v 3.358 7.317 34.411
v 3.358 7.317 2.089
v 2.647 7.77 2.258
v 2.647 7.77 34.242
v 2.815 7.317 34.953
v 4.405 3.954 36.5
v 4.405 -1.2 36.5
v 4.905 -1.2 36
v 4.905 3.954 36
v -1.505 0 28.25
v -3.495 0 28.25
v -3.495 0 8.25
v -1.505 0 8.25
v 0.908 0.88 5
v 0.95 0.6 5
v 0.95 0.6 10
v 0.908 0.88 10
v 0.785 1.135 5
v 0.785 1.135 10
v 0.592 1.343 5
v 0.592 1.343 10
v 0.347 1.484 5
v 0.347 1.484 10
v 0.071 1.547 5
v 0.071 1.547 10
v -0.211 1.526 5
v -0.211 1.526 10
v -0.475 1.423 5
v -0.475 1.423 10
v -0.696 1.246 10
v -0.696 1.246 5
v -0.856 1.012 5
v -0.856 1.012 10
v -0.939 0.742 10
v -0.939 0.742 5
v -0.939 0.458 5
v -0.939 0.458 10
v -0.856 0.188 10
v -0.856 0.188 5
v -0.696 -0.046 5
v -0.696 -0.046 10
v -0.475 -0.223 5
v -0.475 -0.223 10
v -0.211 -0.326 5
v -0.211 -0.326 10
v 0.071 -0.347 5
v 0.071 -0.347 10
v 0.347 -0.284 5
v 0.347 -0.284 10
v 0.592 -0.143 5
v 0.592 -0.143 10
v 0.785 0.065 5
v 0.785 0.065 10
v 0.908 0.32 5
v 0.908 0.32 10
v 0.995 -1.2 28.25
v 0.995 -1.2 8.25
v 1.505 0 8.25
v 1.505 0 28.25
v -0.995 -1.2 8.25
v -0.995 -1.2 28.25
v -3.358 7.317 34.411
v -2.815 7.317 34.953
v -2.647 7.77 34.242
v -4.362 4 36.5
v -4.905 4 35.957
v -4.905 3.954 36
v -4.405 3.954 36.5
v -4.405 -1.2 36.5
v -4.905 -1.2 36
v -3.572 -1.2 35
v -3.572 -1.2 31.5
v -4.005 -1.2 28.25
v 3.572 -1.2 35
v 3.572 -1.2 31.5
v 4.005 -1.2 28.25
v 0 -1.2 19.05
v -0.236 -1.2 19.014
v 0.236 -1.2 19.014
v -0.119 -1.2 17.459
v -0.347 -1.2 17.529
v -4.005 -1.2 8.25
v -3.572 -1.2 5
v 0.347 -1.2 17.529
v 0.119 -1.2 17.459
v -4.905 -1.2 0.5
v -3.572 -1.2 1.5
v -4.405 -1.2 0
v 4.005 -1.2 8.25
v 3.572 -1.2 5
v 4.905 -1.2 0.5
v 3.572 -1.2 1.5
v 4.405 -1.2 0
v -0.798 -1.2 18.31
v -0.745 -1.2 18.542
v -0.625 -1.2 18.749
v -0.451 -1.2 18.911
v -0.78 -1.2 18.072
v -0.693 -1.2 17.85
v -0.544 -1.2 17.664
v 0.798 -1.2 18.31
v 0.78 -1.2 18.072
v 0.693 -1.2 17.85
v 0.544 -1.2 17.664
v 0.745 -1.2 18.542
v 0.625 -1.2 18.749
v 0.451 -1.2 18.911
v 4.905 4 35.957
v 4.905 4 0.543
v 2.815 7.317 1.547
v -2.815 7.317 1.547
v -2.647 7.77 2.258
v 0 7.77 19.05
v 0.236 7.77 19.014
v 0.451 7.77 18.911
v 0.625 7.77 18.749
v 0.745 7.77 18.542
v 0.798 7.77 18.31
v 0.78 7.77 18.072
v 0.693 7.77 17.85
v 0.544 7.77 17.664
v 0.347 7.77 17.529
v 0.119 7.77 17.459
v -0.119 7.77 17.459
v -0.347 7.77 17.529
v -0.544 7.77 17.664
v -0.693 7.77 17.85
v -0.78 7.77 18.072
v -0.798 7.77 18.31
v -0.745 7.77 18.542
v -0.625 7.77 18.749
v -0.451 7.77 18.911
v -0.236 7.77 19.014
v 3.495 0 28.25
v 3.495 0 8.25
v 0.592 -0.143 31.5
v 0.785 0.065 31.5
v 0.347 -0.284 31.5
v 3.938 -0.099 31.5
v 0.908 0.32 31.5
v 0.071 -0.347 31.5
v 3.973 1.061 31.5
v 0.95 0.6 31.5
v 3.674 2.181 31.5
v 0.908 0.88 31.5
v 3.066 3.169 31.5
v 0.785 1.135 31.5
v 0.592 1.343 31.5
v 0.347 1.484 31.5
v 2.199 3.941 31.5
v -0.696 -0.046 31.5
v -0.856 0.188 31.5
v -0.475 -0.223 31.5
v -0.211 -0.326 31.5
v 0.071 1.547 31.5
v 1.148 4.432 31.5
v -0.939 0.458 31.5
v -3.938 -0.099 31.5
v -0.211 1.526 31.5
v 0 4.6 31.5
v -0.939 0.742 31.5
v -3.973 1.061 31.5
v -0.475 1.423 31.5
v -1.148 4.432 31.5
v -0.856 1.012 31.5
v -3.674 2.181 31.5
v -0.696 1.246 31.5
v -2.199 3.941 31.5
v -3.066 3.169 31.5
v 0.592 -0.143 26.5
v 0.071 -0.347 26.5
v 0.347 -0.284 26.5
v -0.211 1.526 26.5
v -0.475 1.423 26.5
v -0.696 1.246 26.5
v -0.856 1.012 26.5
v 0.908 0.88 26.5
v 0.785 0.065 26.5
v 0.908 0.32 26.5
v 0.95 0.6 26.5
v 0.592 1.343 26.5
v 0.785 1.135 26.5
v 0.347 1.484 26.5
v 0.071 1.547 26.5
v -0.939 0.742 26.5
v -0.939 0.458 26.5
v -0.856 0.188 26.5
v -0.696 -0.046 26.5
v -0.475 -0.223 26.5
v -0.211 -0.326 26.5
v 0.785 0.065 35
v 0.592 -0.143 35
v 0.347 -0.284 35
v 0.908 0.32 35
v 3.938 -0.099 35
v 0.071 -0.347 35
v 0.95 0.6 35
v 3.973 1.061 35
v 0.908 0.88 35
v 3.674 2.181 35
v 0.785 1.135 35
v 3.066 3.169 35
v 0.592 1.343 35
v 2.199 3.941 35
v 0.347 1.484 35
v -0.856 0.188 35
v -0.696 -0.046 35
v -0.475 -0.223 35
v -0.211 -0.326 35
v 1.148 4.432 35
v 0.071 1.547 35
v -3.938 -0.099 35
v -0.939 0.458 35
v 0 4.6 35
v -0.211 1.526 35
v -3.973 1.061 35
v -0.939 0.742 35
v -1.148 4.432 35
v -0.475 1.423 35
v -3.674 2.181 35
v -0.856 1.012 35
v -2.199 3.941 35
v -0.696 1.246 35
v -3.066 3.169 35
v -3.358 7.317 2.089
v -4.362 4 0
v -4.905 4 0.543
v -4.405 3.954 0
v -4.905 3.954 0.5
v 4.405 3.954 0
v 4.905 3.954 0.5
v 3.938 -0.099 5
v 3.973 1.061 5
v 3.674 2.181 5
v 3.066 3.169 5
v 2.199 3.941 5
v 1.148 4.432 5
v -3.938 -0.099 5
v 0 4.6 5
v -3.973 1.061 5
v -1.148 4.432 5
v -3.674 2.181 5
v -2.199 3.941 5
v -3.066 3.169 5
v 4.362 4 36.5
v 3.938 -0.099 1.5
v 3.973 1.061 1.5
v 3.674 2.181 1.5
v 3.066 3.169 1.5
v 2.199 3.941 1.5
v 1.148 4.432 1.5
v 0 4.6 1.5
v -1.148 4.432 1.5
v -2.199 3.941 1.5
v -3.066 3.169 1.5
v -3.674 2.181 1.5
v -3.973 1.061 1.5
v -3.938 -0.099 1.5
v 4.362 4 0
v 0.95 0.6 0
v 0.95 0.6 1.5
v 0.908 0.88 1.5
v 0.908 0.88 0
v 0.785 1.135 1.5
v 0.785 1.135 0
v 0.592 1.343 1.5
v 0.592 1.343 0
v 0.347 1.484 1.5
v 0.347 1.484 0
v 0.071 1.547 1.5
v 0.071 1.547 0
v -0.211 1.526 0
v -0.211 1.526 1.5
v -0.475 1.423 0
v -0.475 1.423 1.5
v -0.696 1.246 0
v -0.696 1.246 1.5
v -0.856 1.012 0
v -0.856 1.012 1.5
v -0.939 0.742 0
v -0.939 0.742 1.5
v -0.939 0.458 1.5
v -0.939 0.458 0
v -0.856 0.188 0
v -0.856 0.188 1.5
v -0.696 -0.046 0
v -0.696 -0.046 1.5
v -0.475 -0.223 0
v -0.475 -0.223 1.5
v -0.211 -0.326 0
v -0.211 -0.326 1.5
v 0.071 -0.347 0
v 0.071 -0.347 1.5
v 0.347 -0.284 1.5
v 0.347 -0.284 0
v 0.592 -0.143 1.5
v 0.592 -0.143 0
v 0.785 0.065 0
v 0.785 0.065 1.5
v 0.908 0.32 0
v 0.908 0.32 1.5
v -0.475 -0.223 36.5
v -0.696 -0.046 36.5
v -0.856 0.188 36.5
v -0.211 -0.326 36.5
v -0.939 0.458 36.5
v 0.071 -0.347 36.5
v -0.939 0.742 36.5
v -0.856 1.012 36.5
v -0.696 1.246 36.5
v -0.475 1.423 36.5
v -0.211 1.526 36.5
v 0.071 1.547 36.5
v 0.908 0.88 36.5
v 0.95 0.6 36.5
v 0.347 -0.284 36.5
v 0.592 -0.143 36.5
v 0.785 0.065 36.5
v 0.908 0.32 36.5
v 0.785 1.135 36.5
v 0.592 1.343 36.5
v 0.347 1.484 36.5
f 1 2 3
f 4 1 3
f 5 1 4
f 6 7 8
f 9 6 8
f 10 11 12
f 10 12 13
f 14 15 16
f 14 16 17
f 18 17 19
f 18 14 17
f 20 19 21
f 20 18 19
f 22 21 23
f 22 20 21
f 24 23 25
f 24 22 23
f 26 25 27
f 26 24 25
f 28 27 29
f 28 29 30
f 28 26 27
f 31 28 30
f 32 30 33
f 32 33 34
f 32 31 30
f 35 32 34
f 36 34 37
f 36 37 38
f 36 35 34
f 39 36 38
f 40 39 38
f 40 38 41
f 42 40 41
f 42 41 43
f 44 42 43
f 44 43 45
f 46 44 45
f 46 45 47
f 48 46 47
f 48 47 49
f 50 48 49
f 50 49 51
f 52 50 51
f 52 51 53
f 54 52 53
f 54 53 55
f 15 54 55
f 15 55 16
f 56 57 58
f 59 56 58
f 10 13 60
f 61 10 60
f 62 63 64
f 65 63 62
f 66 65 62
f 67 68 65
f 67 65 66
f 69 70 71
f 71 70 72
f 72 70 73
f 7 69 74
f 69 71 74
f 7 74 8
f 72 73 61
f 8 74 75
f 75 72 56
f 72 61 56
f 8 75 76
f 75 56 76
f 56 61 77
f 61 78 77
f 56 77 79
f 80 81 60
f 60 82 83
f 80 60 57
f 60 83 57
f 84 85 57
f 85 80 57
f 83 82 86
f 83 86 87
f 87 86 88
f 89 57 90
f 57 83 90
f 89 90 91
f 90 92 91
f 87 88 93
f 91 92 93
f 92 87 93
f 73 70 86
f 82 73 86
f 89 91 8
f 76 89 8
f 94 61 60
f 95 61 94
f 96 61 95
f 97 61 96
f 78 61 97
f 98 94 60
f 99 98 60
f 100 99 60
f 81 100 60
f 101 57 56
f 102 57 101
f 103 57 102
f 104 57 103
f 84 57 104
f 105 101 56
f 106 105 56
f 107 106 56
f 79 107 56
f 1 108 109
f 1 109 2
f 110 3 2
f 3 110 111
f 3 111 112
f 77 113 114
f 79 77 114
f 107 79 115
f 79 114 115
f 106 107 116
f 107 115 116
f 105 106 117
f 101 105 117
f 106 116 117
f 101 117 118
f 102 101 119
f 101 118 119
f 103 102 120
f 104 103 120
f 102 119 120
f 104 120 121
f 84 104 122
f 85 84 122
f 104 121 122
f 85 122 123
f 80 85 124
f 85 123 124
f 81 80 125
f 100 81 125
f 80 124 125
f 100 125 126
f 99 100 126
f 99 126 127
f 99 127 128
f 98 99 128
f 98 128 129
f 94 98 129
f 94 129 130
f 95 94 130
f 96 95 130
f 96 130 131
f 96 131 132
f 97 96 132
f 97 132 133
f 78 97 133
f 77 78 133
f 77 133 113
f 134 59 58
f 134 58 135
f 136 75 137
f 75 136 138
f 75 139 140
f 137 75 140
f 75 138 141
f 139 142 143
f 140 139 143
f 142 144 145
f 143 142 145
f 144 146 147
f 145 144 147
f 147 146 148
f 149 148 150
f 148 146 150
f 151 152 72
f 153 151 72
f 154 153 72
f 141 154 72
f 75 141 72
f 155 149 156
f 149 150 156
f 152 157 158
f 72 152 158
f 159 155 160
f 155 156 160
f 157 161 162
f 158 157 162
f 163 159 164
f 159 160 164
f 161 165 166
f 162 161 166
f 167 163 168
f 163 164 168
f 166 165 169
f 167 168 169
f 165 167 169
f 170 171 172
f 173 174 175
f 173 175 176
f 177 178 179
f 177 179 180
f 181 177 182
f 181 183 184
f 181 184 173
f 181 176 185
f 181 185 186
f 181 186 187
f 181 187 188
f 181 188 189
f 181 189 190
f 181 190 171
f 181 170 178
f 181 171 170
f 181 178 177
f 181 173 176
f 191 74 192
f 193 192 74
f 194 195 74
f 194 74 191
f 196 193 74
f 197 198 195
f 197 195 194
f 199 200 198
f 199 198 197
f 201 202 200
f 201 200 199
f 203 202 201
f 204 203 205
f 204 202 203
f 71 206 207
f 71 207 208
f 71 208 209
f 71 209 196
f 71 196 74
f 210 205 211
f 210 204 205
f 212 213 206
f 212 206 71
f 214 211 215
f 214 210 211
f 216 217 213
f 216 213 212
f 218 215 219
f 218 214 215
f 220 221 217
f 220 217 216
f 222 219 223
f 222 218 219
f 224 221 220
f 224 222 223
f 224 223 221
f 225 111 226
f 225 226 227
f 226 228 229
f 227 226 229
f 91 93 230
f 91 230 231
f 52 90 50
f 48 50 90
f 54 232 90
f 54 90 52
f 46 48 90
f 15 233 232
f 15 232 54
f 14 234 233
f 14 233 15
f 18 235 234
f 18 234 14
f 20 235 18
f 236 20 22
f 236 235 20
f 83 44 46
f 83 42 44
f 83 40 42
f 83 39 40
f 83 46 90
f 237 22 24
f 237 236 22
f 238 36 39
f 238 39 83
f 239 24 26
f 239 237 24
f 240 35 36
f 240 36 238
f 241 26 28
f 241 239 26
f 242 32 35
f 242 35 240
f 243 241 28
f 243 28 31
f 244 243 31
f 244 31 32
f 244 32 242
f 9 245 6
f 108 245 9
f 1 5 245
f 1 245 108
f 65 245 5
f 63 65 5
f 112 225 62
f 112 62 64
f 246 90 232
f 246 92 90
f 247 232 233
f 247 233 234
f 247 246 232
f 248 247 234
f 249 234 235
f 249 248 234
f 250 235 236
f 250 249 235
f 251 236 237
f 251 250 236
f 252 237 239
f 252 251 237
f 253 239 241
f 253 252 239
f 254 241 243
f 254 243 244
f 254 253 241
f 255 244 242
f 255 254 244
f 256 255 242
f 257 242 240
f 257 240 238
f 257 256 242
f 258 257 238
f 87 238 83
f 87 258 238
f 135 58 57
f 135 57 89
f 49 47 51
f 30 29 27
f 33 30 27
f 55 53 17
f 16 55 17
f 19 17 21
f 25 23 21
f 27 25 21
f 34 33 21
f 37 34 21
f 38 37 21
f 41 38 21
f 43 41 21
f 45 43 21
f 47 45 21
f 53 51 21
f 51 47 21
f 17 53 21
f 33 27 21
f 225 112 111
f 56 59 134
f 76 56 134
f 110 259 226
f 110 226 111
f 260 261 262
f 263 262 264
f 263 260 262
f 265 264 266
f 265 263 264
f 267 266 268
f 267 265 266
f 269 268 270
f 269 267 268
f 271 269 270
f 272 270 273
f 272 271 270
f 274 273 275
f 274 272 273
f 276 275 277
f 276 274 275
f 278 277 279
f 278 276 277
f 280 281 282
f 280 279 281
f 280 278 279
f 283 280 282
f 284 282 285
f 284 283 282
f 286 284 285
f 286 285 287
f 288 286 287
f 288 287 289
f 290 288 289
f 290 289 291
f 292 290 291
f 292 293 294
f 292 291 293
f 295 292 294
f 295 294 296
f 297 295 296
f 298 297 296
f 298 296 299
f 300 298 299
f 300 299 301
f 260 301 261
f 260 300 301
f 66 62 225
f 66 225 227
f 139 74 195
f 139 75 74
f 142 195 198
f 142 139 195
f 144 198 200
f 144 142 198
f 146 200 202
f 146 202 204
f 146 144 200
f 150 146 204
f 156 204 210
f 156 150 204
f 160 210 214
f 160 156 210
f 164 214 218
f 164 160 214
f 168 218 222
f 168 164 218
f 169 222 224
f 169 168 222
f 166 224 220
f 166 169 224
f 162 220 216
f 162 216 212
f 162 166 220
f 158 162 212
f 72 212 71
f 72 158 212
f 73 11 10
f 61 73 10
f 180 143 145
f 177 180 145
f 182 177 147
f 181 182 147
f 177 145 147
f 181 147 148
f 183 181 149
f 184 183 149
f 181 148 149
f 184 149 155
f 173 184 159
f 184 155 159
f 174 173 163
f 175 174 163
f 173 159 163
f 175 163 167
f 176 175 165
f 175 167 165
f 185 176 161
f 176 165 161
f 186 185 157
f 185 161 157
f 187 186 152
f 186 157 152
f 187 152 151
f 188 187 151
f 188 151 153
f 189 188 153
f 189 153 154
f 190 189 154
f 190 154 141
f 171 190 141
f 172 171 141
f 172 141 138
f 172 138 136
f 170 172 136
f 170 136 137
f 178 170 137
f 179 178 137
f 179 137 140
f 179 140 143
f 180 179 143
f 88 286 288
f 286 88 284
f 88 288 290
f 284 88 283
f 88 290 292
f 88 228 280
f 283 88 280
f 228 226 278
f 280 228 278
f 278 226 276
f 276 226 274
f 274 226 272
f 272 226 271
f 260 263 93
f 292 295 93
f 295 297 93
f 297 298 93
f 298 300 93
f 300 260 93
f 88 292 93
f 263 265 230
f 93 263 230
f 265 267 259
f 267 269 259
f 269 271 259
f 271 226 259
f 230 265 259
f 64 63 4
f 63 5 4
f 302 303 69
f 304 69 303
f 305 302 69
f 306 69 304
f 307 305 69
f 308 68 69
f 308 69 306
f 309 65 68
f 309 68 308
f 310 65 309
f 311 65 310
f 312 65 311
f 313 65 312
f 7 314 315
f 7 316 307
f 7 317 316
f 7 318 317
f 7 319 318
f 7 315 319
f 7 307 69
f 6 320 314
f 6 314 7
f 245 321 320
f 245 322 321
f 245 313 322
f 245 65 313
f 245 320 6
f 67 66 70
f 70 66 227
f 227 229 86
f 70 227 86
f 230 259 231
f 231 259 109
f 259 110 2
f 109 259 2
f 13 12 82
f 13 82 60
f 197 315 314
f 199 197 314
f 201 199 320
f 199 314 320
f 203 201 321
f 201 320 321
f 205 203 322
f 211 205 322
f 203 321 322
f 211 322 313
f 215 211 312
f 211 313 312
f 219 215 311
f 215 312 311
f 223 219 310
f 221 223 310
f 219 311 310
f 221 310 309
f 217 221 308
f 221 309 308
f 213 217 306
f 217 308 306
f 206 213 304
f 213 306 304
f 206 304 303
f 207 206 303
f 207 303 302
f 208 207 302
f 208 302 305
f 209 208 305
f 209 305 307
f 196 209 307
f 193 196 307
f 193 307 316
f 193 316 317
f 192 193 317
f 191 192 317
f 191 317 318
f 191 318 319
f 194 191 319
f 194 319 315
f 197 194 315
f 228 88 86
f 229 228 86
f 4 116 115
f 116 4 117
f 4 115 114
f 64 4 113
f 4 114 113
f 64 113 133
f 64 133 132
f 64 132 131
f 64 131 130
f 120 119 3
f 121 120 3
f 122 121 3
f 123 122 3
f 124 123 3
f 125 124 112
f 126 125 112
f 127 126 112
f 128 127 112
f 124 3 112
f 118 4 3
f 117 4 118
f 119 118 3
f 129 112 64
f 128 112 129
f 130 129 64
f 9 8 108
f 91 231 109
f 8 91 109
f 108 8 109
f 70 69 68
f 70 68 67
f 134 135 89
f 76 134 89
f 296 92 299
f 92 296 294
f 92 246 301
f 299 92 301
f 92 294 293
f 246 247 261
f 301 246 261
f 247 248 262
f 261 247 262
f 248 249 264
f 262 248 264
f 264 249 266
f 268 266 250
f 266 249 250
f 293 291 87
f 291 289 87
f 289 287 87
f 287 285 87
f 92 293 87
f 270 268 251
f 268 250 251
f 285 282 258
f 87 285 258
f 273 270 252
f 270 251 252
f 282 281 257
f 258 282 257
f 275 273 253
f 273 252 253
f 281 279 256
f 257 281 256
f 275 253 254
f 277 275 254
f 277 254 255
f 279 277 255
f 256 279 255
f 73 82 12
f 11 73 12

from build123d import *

# Parameters (mm, degrees)
EXTRUDE_1_DEPTH     = 36.5
CUT_EXTRUDE_1_DEPTH = 39.585575484
SKETCH_3_W          = 8.80936978
SKETCH_3_H          = 5.154088086
EXTRUDE_3_DEPTH     = 8.25
SKETCH_4_R          = 0.95
CUT_EXTRUDE_2_DEPTH = 10
SKETCH_5_W          = 4
SKETCH_5_H          = 3.5
SKETCH_6_R          = 0.8
CUT_EXTRUDE_3_DEPTH = 38.904707278


with BuildPart() as part:
    # ｽｹｯﾁ1 → ﾎﾞｽ - 押し出し1 (new body)
    with BuildSketch(Plane.XY):
        Polygon((-3.49531511, 0), (-1.50468489, 0), (-0.99531511, -1.2), (0.99531511, -1.2), (1.50468489, 0), (3.49531511, 0), (4.00468489, -1.2), (4.90468489, -1.2), (4.90468489, 4), (3.146705018, 7.77), (-3.146705018, 7.77), (-4.90468489, 4), (-4.90468489, -1.2), (-4.00468489, -1.2), align=None)
    extrude(amount=EXTRUDE_1_DEPTH)

    # ｽｹｯﾁ2 → ｶｯﾄ - 押し出し1 (cut, through all)
    with BuildSketch(Plane(origin=(4.90468489, 0, 0), x_dir=(0, 0, -1), z_dir=(1, 0, 0))):
        Polygon((-36.5, 4), (-34.742020129, 7.77), (-36.5, 7.77), align=None)
        Polygon((-1.757979871, 7.77), (0, 7.77), (0, 4), align=None)
    extrude(amount=-CUT_EXTRUDE_1_DEPTH, mode=Mode.SUBTRACT)

    # 面取り1
    # the kernel refuses this chamfer: 0.5 mm, written as the material it takes off along each edge
    with BuildSketch(Plane(origin=(-2.939971721, 7.467897404, 1.964713169), x_dir=(0.19590671622030337, 0.5268881046463144, 0.8270486586180961), z_dir=(-0.41632572739388213, 0.8082980746110389, -0.4163257273938791)), Plane(origin=(2.939971721, 7.467897404, 1.964713169), x_dir=(-0.8270486586180947, 0.5268881046463163, 0.1959067162203037), z_dir=(0.4163257273938816, 0.8082980746110384, -0.41632572739388035))) as chamfer_1_piece_1:
        Polygon((-0.400884159, 0.228990916), (0.459173014, 0.228990916), (-0.058288855, -0.457981831), align=None)
    extrude(amount=0.4579583, mode=Mode.SUBTRACT)
    with BuildSketch(Plane(origin=(-2.939971721, 7.467897404, 34.535286831), x_dir=(-0.1959067162203061, -0.5268881046463181, 0.827048658618093), z_dir=(-0.4163257273938827, 0.8082980746110371, 0.4163257273938816))) as chamfer_1_piece_2:
        Polygon((-0.459173014, 0.228990916), (0.400884159, 0.228990916), (0.058288855, -0.457981831), align=None)
    extrude(amount=0.4579583, mode=Mode.SUBTRACT)
    with BuildSketch(Plane(origin=(2.939971721, 7.467897404, 34.535286831), x_dir=(-0.8270486586180942, 0.5268881046463159, -0.19590671622030717), z_dir=(0.41632572739387785, 0.8082980746110375, 0.41632572739388596))) as chamfer_1_piece_3:
        Polygon((-0.400884159, -0.228990916), (0.459173014, -0.228990916), (-0.058288855, 0.457981831), align=None)
    extrude(amount=0.4579583, mode=Mode.SUBTRACT)
    with BuildSketch(Plane(origin=(4.90468489, -2.485841494, 36.5), x_dir=(-0.999621916911297, 0, 0.0274958766105822), z_dir=(0, 1, 0)), Plane(origin=(-4.90468489, 5.285841494, 36.5), x_dir=(0.999621916911297, 0, 0.0274958766105822), z_dir=(0, -1, 0))) as chamfer_1_piece_4:
        with BuildLine():
            Line((0.514336598, 0), (-0.028273577, -0.513558897))
            Line((-0.028273577, -0.513558897), (-0.038269797, -0.513283938))
            ThreePointArc((-0.038269797, -0.513283938), (-0.017064614, -0.256698915), (-0.009996219, 0.000274959))
            Line((-0.009996219, 0.000274959), (0.000274959, 0.009996219))
            ThreePointArc((0.000274959, 0.009996219), (0.257248832, 0.002927825), (0.514611556, 0.009996219))
            Line((0.514611556, 0.009996219), (0.514336598, 0))
        make_face()
    extrude(amount=7.771682988, mode=Mode.SUBTRACT)
    with BuildSketch(Plane(origin=(-4.90468489, 5.285841494, 0), x_dir=(0.9996219169112968, 0, -0.02749587661058639), z_dir=(0, -1, 0)), Plane(origin=(4.90468489, -2.485841494, 0), x_dir=(-0.9996219169112968, 0, -0.02749587661058639), z_dir=(0, 1, 0))) as chamfer_1_piece_5:
        with BuildLine():
            Line((0.514336598, 0), (-0.028273577, 0.513558897))
            Line((-0.028273577, 0.513558897), (-0.038269797, 0.513283938))
            ThreePointArc((-0.038269797, 0.513283938), (-0.017064614, 0.256698915), (-0.009996219, -0.000274959))
            Line((-0.009996219, -0.000274959), (0.000274959, -0.009996219))
            ThreePointArc((0.000274959, -0.009996219), (0.257248832, -0.002927825), (0.514611556, -0.009996219))
            Line((0.514611556, -0.009996219), (0.514336598, 0))
        make_face()
    extrude(amount=7.771682988, mode=Mode.SUBTRACT)
    with BuildSketch(Plane(origin=(-3.146705018, 7.77, 0.46553106), x_dir=(-0.4413655645980938, -0.8973273864019787, 0), z_dir=(0, 0, 1))) as chamfer_1_piece_6:
        with BuildLine():
            Line((0.516979525, 0), (-0.237770334, 0.459056747))
            Line((-0.237770334, 0.459056747), (-0.246743608, 0.454643091))
            ThreePointArc((-0.246743608, 0.454643091), (-0.123037104, 0.227486173), (-0.008973274, -0.004413656))
            Line((-0.008973274, -0.004413656), (0.000207861, -0.009997839))
            ThreePointArc((0.000207861, -0.009997839), (0.25858594, -0.004626004), (0.517187386, -0.009997839))
            Line((0.517187386, -0.009997839), (0.516979525, 0))
        make_face()
    extrude(amount=35.568937881, mode=Mode.SUBTRACT)
    with BuildSketch(Plane(origin=(3.146705018, 7.77, 0.46553106), x_dir=(0.4413655645980931, -0.8973273864019791, 0), z_dir=(0, 0, 1))) as chamfer_1_piece_7:
        with BuildLine():
            Line((0.516979525, 0), (-0.237770334, -0.459056747))
            Line((-0.237770334, -0.459056747), (-0.246743608, -0.454643091))
            ThreePointArc((-0.246743608, -0.454643091), (-0.123037104, -0.227486173), (-0.008973274, 0.004413656))
            Line((-0.008973274, 0.004413656), (0.000207861, 0.009997839))
            ThreePointArc((0.000207861, 0.009997839), (0.25858594, 0.004626004), (0.517187386, 0.009997839))
            Line((0.517187386, 0.009997839), (0.516979525, 0))
        make_face()
    extrude(amount=35.568937881, mode=Mode.SUBTRACT)
    with BuildSketch(Plane(origin=(4.43915383, 7.77, 34.742020129), x_dir=(0, -0.8973273864019841, 0.4413655645980827), z_dir=(-1, 0, 0))) as chamfer_1_piece_8:
        with BuildLine():
            Line((0.516979525, 0), (-0.237770334, -0.459056747))
            Line((-0.237770334, -0.459056747), (-0.246743608, -0.454643091))
            ThreePointArc((-0.246743608, -0.454643091), (-0.123037104, -0.227486173), (-0.008973274, 0.004413656))
            Line((-0.008973274, 0.004413656), (0.000207861, 0.009997839))
            ThreePointArc((0.000207861, 0.009997839), (0.25858594, 0.004626004), (0.517187386, 0.009997839))
            Line((0.517187386, 0.009997839), (0.516979525, 0))
        make_face()
    extrude(amount=8.87830766, mode=Mode.SUBTRACT)
    with BuildSketch(Plane(origin=(2.645006091, 8.845896822, 34.240321201), x_dir=(-0.9208340423276122, -0.3421923931836881, 0.1870000869994703), z_dir=(0.38928162063502675, -0.8348171294789896, 0.3892816206350195)), Plane(origin=(-5.406383817, 2.924103178, 37.001698928), x_dir=(0.9208340423276125, -0.34219239318369504, 0.18700008699945572), z_dir=(0.38928162063502675, 0.8348171294789896, -0.3892816206350195))) as chamfer_1_piece_9:
        with BuildLine():
            Line((0.515512576, 0), (-0.117174183, 0.502019349))
            Line((-0.117174183, 0.502019349), (-0.126965941, 0.499989208))
            ThreePointArc((-0.126965941, 0.499989208), (-0.062103739, 0.250280562), (-0.009791758, -0.002030141))
            Line((-0.009791758, -0.002030141), (0.000248629, -0.009996909))
            ThreePointArc((0.000248629, -0.009996909), (0.257845581, -0.003590326), (0.515761205, -0.009996909))
            Line((0.515761205, -0.009996909), (0.515512576, 0))
        make_face()
    extrude(amount=7.093521964, mode=Mode.SUBTRACT)
    with BuildSketch(Plane(origin=(2.645006091, 8.845896822, 2.259678799), x_dir=(-0.9208340423276122, -0.3421923931836898, -0.18700008699946685), z_dir=(0.3892816206350268, -0.8348171294789898, -0.3892816206350187)), Plane(origin=(-5.406383817, 2.924103178, -0.501698928), x_dir=(0.9208340423276122, -0.34219239318368977, -0.1870000869994671), z_dir=(0.3892816206350268, 0.8348171294789898, 0.3892816206350187))) as chamfer_1_piece_10:
        with BuildLine():
            Line((0.515512576, 0), (-0.117174183, -0.502019349))
            Line((-0.117174183, -0.502019349), (-0.126965941, -0.499989208))
            ThreePointArc((-0.126965941, -0.499989208), (-0.062103739, -0.250280562), (-0.009791758, 0.002030141))
            Line((-0.009791758, 0.002030141), (0.000248629, 0.009996909))
            ThreePointArc((0.000248629, 0.009996909), (0.257845581, 0.003590326), (0.515761205, 0.009996909))
            Line((0.515761205, 0.009996909), (0.515512576, 0))
        make_face()
    extrude(amount=7.093521964, mode=Mode.SUBTRACT)
    with BuildSketch(Plane(origin=(4.43915383, 7.77, 1.757979871), x_dir=(0, -0.8973273864019825, -0.4413655645980858), z_dir=(-1, 0, 0))) as chamfer_1_piece_11:
        with BuildLine():
            Line((0.516979525, 0), (-0.237770334, 0.459056747))
            Line((-0.237770334, 0.459056747), (-0.246743608, 0.454643091))
            ThreePointArc((-0.246743608, 0.454643091), (-0.123037104, 0.227486173), (-0.008973274, -0.004413656))
            Line((-0.008973274, -0.004413656), (0.000207861, -0.009997839))
            ThreePointArc((0.000207861, -0.009997839), (0.25858594, -0.004626004), (0.517187386, -0.009997839))
            Line((0.517187386, -0.009997839), (0.516979525, 0))
        make_face()
    extrude(amount=8.87830766, mode=Mode.SUBTRACT)

    # ｽｹｯﾁ3 → ﾎﾞｽ - 押し出し3 (add)
    with BuildSketch(Plane.XY.offset(36.5)):
        with Locations((0, 1.377044043)):
            Rectangle(SKETCH_3_W, SKETCH_3_H)
    extrude_3 = extrude(amount=-EXTRUDE_3_DEPTH)

    # ｽｹｯﾁ4 → ｶｯﾄ - 押し出し2 (cut)
    with BuildSketch(Plane.XY.offset(36.5)):
        with Locations((0, 0.6)):
            Circle(SKETCH_4_R)
    cut_extrude_2 = extrude(amount=-CUT_EXTRUDE_2_DEPTH, mode=Mode.SUBTRACT)

    # ﾐﾗｰ1: ﾎﾞｽ - 押し出し3, ｶｯﾄ - 押し出し2 across plane
    add(extrude_3.mirror(Plane(origin=(0, 0, 18.25), x_dir=(1, 0, 0), z_dir=(0, 0, -1))))
    add(cut_extrude_2.mirror(Plane(origin=(0, 0, 18.25), x_dir=(1, 0, 0), z_dir=(0, 0, -1))), mode=Mode.SUBTRACT)

    # ｽｹｯﾁ5 → ｶｯﾄ - 回転1 (revolve, cut)
    with BuildSketch(Plane(origin=(0, 0.6, 0), x_dir=(1, 0, 0), z_dir=(0, 1, 0))):
        with Locations((2, -33.25)):
            Rectangle(SKETCH_5_W, SKETCH_5_H)
        with Locations((2, -3.25)):
            Rectangle(SKETCH_5_W, SKETCH_5_H)
    revolve(axis=Axis((0, 0.6, 26.5), (0, 0, 1)), mode=Mode.SUBTRACT)

    # ｽｹｯﾁ6 → ｶｯﾄ - 押し出し3 (cut, through all)
    with BuildSketch(Plane(origin=(0, 7.77, 0), x_dir=(1, 0, 0), z_dir=(0, 1, 0))):
        with Locations(Location((0, -18.25, 0), (0, 0, 270))):
            Circle(SKETCH_6_R)
    extrude(amount=-CUT_EXTRUDE_3_DEPTH, mode=Mode.SUBTRACT)


solid = part.part
